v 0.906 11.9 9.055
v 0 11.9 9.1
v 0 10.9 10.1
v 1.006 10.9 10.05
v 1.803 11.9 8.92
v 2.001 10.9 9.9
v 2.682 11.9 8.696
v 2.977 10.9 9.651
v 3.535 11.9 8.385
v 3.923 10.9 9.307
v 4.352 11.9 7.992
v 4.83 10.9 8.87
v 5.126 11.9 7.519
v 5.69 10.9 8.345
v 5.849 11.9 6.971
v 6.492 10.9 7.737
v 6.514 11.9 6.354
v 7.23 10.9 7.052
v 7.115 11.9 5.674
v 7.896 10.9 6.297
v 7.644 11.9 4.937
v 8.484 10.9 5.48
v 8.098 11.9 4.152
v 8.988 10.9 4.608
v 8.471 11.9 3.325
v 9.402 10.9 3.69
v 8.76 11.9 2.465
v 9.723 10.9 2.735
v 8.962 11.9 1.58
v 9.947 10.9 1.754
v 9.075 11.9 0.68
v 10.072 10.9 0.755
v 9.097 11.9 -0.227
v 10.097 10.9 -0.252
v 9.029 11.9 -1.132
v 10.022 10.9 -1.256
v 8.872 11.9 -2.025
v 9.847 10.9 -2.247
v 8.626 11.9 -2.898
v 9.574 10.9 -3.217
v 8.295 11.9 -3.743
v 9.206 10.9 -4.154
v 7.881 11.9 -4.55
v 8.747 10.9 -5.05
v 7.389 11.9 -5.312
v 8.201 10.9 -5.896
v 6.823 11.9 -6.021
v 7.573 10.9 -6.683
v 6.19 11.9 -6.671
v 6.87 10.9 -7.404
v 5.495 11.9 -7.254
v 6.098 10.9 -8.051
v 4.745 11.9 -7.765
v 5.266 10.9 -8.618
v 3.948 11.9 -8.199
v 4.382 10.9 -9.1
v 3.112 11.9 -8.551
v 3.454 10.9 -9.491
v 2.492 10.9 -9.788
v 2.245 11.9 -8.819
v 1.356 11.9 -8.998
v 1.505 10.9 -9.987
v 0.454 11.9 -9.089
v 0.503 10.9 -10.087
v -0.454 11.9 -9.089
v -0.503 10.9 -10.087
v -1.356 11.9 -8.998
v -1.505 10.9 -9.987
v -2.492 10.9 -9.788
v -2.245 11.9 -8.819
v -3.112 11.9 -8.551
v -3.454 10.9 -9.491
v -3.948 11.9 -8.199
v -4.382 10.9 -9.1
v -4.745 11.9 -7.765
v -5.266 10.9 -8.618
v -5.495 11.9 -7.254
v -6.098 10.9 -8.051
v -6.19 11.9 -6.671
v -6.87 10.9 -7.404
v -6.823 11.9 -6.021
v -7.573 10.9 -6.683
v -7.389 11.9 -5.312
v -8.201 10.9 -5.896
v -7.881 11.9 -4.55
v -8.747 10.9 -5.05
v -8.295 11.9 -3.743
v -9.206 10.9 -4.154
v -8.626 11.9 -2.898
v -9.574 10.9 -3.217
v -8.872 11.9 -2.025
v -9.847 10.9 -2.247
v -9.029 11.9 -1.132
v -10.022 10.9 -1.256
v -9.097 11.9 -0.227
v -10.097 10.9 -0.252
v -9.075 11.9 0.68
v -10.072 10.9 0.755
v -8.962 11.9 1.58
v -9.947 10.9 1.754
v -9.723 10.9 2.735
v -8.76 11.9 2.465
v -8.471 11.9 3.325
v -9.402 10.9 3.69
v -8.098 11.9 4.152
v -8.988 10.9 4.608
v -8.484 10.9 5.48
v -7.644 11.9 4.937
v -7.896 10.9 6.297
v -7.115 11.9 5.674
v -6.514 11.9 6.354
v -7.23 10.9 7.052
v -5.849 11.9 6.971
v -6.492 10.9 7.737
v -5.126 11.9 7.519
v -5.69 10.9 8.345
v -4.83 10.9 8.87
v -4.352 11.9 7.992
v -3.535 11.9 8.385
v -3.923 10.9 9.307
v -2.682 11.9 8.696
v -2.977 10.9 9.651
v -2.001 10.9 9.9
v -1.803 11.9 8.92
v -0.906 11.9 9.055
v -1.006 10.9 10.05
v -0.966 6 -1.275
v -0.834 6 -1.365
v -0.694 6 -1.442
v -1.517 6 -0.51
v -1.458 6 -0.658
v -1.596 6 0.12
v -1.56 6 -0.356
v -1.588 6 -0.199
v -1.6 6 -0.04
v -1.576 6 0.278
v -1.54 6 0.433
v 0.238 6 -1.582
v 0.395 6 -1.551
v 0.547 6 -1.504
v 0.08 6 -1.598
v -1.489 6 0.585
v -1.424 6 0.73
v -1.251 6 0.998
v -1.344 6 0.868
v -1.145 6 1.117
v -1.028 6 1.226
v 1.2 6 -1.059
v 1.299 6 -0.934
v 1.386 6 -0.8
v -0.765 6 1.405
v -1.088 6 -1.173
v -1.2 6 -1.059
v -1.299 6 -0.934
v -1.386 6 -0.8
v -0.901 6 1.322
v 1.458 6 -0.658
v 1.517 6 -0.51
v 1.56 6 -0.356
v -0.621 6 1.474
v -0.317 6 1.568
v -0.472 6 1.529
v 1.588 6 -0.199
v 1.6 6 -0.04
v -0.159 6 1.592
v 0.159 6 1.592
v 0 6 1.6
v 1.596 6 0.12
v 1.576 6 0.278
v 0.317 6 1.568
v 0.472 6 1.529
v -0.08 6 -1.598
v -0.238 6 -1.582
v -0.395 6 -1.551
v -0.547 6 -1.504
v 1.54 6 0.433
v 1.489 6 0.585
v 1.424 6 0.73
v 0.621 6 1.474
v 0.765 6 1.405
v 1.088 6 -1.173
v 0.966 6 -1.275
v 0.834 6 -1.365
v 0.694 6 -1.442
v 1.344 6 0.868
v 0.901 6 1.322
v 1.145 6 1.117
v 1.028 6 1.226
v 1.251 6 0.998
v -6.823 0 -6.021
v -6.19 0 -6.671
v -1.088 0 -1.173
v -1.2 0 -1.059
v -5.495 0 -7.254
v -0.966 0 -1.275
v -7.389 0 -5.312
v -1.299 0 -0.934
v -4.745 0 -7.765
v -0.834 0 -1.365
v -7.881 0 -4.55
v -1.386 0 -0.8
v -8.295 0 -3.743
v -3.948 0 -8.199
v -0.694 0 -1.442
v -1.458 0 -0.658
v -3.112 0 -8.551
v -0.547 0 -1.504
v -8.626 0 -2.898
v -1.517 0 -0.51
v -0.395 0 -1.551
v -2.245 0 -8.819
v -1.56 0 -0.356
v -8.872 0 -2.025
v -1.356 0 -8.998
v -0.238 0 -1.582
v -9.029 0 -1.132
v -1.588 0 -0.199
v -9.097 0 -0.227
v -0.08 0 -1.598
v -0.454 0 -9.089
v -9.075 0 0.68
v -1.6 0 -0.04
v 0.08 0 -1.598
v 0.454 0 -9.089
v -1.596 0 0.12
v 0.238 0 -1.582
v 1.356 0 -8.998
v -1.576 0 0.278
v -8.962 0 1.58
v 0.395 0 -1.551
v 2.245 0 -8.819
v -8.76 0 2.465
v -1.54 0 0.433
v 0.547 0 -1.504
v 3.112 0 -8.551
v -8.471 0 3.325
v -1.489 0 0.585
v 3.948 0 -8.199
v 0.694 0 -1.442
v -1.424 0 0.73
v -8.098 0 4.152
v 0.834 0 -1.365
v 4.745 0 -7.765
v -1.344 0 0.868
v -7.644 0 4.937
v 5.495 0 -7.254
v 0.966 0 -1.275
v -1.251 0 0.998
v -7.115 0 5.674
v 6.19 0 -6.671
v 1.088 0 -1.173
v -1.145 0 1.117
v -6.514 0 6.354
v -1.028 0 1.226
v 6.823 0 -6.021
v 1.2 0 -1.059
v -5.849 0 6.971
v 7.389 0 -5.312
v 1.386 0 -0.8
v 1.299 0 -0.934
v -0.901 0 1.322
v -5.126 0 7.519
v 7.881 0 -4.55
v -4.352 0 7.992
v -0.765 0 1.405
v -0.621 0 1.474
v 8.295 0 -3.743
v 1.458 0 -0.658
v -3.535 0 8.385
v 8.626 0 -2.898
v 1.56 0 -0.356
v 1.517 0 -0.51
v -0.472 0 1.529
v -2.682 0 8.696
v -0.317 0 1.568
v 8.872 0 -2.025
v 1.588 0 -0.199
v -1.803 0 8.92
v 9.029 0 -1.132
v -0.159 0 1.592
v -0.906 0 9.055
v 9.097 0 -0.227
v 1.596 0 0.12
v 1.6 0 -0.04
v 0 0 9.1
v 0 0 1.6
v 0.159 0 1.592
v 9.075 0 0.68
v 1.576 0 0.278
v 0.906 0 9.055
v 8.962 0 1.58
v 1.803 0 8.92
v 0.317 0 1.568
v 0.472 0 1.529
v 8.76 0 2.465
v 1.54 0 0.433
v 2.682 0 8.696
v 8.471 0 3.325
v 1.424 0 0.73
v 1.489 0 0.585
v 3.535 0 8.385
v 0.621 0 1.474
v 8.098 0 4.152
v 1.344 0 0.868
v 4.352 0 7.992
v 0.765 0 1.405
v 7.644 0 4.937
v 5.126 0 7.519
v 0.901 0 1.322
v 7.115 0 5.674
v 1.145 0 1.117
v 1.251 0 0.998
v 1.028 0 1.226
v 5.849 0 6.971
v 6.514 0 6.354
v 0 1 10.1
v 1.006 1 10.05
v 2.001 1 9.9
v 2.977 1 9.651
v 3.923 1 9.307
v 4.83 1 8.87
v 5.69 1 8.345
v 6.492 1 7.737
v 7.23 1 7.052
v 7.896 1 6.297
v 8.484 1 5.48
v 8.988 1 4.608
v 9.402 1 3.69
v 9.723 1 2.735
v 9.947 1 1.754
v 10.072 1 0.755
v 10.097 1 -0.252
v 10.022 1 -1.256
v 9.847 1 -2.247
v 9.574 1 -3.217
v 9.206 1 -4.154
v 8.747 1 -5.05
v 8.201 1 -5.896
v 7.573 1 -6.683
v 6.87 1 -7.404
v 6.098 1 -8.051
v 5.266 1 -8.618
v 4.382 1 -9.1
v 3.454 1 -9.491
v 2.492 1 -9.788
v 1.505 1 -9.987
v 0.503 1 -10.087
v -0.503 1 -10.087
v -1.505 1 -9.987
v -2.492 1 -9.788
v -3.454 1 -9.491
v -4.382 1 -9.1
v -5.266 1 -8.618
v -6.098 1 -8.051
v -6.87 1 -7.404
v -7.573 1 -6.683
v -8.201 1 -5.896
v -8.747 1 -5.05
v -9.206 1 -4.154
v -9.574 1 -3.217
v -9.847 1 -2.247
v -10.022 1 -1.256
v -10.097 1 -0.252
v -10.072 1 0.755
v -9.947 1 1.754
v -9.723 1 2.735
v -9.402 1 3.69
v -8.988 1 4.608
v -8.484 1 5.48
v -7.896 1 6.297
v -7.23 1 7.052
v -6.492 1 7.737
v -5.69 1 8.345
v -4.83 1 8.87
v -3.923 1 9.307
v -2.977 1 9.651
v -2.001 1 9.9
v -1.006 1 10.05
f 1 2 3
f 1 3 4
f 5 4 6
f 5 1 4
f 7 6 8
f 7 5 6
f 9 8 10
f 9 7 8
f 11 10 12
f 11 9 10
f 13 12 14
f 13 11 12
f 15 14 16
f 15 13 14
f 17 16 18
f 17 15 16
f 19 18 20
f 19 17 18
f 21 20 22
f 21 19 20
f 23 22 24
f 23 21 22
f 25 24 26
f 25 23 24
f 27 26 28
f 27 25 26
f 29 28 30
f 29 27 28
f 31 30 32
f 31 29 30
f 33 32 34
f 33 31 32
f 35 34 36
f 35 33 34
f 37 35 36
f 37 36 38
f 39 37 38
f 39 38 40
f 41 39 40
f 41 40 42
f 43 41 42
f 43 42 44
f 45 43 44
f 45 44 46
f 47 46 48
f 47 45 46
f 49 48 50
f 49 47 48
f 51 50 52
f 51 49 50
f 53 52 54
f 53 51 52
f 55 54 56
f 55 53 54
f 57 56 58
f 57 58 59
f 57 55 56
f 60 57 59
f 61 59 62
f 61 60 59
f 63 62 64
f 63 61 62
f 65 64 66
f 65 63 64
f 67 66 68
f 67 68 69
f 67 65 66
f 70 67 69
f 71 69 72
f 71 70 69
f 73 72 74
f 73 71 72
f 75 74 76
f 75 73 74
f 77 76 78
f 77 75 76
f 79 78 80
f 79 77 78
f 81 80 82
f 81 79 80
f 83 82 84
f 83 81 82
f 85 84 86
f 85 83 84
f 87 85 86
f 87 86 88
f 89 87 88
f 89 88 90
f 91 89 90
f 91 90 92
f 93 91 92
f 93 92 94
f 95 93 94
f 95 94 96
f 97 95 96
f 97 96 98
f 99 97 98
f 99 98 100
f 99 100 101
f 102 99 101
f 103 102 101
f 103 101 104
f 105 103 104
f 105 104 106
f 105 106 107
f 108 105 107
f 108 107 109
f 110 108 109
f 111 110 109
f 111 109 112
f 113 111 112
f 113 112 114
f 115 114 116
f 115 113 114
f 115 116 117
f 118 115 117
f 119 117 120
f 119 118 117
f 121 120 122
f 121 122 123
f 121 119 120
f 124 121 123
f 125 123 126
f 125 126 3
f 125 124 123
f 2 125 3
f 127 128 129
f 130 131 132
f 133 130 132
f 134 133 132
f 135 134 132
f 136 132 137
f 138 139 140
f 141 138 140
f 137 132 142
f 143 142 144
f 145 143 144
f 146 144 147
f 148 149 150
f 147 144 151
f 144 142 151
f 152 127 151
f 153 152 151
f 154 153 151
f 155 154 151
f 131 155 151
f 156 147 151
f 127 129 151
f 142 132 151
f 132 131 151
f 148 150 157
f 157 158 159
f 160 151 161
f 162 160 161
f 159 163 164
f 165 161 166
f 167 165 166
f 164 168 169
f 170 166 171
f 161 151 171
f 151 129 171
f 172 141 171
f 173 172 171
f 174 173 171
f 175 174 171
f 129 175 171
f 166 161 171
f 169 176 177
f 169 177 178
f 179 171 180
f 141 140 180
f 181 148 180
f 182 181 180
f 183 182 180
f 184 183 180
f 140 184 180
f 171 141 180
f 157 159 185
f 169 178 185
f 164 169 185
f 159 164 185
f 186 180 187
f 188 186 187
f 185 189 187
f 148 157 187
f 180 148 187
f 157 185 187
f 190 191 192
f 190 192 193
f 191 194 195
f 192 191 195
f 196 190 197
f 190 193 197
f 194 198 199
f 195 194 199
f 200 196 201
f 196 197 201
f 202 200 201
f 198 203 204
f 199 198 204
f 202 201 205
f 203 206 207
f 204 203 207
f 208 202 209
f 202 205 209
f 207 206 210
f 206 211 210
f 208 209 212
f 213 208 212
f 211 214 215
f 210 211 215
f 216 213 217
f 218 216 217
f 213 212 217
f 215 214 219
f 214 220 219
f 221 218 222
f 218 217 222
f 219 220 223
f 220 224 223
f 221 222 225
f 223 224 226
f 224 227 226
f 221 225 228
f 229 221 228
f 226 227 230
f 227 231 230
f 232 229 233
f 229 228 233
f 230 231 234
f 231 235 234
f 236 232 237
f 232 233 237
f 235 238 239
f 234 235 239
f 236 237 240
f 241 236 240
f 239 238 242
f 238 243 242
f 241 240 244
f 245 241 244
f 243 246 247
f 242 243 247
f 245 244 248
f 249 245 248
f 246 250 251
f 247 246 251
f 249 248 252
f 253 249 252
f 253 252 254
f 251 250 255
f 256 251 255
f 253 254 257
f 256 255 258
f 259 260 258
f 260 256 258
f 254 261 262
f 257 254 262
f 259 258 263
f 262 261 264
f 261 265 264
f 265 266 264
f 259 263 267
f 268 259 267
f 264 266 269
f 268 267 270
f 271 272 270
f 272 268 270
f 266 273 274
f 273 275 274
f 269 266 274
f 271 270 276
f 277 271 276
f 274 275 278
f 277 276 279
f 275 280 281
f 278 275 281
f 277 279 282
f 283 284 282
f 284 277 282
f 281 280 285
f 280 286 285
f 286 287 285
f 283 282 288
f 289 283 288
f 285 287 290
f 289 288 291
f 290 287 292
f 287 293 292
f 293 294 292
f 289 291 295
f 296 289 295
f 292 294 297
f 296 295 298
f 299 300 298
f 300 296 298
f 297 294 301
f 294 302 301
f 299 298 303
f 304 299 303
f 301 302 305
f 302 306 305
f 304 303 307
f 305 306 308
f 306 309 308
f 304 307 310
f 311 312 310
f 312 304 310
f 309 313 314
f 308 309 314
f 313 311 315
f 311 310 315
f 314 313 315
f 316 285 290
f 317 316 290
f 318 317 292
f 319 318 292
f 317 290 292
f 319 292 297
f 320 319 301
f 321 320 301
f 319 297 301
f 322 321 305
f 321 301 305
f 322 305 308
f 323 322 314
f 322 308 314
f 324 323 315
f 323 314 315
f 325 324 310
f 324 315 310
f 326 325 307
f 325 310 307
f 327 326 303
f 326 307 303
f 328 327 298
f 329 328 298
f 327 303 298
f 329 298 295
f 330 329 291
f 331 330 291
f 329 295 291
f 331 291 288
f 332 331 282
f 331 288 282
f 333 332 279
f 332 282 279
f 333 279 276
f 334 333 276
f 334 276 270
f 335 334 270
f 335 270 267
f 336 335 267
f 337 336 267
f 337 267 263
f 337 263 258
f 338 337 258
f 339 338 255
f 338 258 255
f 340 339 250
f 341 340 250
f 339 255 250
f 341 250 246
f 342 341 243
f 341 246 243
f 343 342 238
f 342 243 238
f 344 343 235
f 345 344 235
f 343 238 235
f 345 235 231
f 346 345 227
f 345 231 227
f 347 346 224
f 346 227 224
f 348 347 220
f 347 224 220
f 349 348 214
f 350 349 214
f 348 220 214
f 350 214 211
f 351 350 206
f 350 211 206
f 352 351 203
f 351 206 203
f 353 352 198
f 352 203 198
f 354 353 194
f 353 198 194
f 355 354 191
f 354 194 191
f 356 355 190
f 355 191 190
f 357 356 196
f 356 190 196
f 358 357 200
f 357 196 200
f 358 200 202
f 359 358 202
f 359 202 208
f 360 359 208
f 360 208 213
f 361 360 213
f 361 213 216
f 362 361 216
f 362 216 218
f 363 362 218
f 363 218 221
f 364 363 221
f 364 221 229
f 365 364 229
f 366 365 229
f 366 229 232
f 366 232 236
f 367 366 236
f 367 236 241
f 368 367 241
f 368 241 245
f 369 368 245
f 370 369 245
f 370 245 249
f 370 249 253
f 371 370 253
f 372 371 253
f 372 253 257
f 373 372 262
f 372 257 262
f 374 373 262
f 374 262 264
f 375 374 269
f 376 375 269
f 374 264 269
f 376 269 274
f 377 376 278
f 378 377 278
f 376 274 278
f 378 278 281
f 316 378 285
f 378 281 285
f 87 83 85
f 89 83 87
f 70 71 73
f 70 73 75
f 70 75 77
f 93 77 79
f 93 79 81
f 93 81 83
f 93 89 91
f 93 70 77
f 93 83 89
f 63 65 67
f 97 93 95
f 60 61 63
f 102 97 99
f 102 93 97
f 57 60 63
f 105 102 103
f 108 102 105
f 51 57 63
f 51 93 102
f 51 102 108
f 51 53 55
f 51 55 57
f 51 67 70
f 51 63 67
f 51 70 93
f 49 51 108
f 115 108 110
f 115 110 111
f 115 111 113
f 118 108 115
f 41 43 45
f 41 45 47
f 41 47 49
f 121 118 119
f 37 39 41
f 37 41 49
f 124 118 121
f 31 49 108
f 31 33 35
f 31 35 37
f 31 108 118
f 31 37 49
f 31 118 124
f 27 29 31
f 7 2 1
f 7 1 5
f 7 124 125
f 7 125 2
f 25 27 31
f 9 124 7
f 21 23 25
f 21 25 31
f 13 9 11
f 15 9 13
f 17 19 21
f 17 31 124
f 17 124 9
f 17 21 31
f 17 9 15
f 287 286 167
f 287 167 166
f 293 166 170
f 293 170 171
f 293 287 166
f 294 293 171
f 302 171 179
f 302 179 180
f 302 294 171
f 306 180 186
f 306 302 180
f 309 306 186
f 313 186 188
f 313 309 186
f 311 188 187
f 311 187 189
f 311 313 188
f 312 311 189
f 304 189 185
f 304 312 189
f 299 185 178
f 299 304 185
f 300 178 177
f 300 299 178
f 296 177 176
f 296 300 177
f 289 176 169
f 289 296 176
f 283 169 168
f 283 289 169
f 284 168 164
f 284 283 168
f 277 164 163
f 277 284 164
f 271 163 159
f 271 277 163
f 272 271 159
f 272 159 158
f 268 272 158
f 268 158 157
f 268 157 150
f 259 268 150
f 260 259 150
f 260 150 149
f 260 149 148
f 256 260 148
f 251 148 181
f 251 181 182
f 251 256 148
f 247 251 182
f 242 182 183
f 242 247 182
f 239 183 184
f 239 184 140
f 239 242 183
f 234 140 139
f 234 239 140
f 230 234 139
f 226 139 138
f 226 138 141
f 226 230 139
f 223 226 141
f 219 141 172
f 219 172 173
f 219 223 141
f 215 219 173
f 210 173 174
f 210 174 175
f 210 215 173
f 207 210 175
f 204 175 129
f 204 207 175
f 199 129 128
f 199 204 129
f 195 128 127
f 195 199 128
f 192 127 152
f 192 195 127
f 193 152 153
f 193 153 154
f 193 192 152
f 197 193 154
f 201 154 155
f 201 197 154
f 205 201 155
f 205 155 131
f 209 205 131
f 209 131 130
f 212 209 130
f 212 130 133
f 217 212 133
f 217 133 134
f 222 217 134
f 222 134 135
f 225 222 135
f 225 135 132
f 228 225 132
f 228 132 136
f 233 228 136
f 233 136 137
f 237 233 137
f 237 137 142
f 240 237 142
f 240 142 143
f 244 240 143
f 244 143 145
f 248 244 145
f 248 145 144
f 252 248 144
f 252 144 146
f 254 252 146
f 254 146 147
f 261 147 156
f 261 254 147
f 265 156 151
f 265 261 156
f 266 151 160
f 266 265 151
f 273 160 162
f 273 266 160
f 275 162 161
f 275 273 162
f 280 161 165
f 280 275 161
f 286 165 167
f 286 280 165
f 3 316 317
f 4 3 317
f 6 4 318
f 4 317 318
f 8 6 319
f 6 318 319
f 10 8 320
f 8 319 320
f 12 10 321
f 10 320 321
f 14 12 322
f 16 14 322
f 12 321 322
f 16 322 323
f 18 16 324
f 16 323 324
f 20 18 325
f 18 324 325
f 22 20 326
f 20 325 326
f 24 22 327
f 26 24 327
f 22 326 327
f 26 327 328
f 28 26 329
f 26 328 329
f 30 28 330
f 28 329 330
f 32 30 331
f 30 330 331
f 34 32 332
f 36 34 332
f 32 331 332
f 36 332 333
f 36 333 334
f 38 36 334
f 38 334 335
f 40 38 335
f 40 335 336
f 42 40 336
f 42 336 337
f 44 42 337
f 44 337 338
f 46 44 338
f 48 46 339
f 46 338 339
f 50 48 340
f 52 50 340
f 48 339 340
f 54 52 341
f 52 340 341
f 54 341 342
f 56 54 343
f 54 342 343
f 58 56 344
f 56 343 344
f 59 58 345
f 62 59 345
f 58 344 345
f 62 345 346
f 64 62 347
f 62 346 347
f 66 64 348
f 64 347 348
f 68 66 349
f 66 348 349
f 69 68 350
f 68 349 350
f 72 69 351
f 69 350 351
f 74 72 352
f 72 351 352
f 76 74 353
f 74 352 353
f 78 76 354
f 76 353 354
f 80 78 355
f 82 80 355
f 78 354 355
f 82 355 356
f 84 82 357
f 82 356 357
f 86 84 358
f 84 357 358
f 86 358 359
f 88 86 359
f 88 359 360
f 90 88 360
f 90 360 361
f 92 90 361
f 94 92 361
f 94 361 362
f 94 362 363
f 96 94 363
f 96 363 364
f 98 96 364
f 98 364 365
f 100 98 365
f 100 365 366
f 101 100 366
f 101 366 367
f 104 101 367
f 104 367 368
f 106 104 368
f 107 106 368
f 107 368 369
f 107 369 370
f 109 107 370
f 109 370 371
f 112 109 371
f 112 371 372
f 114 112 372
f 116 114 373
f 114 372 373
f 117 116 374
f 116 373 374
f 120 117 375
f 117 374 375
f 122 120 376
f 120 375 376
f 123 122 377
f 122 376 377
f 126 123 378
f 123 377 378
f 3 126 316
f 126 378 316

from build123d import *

# Parameters (mm, degrees)
SKETCH1_R           = 10.1
BOSS_EXTRUDE1_DEPTH = 11.9
SKETCH1_4_R         = 1.6
CUT_EXTRUDE1_DEPTH  = 6
CHAMFER1_SIZE       = 1


with BuildPart() as part:
    # Sketch1 → Boss-Extrude1 (new body)
    with BuildSketch(Plane(origin=(0, 0, 0), x_dir=(1, 0, 0), z_dir=(0, 1, 0))):
        Circle(SKETCH1_R)
    extrude(amount=BOSS_EXTRUDE1_DEPTH)

    # Sketch1<4> → Cut-Extrude1 (cut)
    with BuildSketch(Plane(origin=(0, 0, 0), x_dir=(1, 0, 0), z_dir=(0, 1, 0))):
        Circle(SKETCH1_4_R)
    extrude(amount=CUT_EXTRUDE1_DEPTH, mode=Mode.SUBTRACT)

    # Chamfer1
    chamfer1_edges = [part.edges().sort_by_distance(p)[0] for p in [
        (-10.1, 11.9, 0),
        (-10.1, 0, 0),
    ]]
    chamfer(chamfer1_edges, length=CHAMFER1_SIZE)


solid = part.part
